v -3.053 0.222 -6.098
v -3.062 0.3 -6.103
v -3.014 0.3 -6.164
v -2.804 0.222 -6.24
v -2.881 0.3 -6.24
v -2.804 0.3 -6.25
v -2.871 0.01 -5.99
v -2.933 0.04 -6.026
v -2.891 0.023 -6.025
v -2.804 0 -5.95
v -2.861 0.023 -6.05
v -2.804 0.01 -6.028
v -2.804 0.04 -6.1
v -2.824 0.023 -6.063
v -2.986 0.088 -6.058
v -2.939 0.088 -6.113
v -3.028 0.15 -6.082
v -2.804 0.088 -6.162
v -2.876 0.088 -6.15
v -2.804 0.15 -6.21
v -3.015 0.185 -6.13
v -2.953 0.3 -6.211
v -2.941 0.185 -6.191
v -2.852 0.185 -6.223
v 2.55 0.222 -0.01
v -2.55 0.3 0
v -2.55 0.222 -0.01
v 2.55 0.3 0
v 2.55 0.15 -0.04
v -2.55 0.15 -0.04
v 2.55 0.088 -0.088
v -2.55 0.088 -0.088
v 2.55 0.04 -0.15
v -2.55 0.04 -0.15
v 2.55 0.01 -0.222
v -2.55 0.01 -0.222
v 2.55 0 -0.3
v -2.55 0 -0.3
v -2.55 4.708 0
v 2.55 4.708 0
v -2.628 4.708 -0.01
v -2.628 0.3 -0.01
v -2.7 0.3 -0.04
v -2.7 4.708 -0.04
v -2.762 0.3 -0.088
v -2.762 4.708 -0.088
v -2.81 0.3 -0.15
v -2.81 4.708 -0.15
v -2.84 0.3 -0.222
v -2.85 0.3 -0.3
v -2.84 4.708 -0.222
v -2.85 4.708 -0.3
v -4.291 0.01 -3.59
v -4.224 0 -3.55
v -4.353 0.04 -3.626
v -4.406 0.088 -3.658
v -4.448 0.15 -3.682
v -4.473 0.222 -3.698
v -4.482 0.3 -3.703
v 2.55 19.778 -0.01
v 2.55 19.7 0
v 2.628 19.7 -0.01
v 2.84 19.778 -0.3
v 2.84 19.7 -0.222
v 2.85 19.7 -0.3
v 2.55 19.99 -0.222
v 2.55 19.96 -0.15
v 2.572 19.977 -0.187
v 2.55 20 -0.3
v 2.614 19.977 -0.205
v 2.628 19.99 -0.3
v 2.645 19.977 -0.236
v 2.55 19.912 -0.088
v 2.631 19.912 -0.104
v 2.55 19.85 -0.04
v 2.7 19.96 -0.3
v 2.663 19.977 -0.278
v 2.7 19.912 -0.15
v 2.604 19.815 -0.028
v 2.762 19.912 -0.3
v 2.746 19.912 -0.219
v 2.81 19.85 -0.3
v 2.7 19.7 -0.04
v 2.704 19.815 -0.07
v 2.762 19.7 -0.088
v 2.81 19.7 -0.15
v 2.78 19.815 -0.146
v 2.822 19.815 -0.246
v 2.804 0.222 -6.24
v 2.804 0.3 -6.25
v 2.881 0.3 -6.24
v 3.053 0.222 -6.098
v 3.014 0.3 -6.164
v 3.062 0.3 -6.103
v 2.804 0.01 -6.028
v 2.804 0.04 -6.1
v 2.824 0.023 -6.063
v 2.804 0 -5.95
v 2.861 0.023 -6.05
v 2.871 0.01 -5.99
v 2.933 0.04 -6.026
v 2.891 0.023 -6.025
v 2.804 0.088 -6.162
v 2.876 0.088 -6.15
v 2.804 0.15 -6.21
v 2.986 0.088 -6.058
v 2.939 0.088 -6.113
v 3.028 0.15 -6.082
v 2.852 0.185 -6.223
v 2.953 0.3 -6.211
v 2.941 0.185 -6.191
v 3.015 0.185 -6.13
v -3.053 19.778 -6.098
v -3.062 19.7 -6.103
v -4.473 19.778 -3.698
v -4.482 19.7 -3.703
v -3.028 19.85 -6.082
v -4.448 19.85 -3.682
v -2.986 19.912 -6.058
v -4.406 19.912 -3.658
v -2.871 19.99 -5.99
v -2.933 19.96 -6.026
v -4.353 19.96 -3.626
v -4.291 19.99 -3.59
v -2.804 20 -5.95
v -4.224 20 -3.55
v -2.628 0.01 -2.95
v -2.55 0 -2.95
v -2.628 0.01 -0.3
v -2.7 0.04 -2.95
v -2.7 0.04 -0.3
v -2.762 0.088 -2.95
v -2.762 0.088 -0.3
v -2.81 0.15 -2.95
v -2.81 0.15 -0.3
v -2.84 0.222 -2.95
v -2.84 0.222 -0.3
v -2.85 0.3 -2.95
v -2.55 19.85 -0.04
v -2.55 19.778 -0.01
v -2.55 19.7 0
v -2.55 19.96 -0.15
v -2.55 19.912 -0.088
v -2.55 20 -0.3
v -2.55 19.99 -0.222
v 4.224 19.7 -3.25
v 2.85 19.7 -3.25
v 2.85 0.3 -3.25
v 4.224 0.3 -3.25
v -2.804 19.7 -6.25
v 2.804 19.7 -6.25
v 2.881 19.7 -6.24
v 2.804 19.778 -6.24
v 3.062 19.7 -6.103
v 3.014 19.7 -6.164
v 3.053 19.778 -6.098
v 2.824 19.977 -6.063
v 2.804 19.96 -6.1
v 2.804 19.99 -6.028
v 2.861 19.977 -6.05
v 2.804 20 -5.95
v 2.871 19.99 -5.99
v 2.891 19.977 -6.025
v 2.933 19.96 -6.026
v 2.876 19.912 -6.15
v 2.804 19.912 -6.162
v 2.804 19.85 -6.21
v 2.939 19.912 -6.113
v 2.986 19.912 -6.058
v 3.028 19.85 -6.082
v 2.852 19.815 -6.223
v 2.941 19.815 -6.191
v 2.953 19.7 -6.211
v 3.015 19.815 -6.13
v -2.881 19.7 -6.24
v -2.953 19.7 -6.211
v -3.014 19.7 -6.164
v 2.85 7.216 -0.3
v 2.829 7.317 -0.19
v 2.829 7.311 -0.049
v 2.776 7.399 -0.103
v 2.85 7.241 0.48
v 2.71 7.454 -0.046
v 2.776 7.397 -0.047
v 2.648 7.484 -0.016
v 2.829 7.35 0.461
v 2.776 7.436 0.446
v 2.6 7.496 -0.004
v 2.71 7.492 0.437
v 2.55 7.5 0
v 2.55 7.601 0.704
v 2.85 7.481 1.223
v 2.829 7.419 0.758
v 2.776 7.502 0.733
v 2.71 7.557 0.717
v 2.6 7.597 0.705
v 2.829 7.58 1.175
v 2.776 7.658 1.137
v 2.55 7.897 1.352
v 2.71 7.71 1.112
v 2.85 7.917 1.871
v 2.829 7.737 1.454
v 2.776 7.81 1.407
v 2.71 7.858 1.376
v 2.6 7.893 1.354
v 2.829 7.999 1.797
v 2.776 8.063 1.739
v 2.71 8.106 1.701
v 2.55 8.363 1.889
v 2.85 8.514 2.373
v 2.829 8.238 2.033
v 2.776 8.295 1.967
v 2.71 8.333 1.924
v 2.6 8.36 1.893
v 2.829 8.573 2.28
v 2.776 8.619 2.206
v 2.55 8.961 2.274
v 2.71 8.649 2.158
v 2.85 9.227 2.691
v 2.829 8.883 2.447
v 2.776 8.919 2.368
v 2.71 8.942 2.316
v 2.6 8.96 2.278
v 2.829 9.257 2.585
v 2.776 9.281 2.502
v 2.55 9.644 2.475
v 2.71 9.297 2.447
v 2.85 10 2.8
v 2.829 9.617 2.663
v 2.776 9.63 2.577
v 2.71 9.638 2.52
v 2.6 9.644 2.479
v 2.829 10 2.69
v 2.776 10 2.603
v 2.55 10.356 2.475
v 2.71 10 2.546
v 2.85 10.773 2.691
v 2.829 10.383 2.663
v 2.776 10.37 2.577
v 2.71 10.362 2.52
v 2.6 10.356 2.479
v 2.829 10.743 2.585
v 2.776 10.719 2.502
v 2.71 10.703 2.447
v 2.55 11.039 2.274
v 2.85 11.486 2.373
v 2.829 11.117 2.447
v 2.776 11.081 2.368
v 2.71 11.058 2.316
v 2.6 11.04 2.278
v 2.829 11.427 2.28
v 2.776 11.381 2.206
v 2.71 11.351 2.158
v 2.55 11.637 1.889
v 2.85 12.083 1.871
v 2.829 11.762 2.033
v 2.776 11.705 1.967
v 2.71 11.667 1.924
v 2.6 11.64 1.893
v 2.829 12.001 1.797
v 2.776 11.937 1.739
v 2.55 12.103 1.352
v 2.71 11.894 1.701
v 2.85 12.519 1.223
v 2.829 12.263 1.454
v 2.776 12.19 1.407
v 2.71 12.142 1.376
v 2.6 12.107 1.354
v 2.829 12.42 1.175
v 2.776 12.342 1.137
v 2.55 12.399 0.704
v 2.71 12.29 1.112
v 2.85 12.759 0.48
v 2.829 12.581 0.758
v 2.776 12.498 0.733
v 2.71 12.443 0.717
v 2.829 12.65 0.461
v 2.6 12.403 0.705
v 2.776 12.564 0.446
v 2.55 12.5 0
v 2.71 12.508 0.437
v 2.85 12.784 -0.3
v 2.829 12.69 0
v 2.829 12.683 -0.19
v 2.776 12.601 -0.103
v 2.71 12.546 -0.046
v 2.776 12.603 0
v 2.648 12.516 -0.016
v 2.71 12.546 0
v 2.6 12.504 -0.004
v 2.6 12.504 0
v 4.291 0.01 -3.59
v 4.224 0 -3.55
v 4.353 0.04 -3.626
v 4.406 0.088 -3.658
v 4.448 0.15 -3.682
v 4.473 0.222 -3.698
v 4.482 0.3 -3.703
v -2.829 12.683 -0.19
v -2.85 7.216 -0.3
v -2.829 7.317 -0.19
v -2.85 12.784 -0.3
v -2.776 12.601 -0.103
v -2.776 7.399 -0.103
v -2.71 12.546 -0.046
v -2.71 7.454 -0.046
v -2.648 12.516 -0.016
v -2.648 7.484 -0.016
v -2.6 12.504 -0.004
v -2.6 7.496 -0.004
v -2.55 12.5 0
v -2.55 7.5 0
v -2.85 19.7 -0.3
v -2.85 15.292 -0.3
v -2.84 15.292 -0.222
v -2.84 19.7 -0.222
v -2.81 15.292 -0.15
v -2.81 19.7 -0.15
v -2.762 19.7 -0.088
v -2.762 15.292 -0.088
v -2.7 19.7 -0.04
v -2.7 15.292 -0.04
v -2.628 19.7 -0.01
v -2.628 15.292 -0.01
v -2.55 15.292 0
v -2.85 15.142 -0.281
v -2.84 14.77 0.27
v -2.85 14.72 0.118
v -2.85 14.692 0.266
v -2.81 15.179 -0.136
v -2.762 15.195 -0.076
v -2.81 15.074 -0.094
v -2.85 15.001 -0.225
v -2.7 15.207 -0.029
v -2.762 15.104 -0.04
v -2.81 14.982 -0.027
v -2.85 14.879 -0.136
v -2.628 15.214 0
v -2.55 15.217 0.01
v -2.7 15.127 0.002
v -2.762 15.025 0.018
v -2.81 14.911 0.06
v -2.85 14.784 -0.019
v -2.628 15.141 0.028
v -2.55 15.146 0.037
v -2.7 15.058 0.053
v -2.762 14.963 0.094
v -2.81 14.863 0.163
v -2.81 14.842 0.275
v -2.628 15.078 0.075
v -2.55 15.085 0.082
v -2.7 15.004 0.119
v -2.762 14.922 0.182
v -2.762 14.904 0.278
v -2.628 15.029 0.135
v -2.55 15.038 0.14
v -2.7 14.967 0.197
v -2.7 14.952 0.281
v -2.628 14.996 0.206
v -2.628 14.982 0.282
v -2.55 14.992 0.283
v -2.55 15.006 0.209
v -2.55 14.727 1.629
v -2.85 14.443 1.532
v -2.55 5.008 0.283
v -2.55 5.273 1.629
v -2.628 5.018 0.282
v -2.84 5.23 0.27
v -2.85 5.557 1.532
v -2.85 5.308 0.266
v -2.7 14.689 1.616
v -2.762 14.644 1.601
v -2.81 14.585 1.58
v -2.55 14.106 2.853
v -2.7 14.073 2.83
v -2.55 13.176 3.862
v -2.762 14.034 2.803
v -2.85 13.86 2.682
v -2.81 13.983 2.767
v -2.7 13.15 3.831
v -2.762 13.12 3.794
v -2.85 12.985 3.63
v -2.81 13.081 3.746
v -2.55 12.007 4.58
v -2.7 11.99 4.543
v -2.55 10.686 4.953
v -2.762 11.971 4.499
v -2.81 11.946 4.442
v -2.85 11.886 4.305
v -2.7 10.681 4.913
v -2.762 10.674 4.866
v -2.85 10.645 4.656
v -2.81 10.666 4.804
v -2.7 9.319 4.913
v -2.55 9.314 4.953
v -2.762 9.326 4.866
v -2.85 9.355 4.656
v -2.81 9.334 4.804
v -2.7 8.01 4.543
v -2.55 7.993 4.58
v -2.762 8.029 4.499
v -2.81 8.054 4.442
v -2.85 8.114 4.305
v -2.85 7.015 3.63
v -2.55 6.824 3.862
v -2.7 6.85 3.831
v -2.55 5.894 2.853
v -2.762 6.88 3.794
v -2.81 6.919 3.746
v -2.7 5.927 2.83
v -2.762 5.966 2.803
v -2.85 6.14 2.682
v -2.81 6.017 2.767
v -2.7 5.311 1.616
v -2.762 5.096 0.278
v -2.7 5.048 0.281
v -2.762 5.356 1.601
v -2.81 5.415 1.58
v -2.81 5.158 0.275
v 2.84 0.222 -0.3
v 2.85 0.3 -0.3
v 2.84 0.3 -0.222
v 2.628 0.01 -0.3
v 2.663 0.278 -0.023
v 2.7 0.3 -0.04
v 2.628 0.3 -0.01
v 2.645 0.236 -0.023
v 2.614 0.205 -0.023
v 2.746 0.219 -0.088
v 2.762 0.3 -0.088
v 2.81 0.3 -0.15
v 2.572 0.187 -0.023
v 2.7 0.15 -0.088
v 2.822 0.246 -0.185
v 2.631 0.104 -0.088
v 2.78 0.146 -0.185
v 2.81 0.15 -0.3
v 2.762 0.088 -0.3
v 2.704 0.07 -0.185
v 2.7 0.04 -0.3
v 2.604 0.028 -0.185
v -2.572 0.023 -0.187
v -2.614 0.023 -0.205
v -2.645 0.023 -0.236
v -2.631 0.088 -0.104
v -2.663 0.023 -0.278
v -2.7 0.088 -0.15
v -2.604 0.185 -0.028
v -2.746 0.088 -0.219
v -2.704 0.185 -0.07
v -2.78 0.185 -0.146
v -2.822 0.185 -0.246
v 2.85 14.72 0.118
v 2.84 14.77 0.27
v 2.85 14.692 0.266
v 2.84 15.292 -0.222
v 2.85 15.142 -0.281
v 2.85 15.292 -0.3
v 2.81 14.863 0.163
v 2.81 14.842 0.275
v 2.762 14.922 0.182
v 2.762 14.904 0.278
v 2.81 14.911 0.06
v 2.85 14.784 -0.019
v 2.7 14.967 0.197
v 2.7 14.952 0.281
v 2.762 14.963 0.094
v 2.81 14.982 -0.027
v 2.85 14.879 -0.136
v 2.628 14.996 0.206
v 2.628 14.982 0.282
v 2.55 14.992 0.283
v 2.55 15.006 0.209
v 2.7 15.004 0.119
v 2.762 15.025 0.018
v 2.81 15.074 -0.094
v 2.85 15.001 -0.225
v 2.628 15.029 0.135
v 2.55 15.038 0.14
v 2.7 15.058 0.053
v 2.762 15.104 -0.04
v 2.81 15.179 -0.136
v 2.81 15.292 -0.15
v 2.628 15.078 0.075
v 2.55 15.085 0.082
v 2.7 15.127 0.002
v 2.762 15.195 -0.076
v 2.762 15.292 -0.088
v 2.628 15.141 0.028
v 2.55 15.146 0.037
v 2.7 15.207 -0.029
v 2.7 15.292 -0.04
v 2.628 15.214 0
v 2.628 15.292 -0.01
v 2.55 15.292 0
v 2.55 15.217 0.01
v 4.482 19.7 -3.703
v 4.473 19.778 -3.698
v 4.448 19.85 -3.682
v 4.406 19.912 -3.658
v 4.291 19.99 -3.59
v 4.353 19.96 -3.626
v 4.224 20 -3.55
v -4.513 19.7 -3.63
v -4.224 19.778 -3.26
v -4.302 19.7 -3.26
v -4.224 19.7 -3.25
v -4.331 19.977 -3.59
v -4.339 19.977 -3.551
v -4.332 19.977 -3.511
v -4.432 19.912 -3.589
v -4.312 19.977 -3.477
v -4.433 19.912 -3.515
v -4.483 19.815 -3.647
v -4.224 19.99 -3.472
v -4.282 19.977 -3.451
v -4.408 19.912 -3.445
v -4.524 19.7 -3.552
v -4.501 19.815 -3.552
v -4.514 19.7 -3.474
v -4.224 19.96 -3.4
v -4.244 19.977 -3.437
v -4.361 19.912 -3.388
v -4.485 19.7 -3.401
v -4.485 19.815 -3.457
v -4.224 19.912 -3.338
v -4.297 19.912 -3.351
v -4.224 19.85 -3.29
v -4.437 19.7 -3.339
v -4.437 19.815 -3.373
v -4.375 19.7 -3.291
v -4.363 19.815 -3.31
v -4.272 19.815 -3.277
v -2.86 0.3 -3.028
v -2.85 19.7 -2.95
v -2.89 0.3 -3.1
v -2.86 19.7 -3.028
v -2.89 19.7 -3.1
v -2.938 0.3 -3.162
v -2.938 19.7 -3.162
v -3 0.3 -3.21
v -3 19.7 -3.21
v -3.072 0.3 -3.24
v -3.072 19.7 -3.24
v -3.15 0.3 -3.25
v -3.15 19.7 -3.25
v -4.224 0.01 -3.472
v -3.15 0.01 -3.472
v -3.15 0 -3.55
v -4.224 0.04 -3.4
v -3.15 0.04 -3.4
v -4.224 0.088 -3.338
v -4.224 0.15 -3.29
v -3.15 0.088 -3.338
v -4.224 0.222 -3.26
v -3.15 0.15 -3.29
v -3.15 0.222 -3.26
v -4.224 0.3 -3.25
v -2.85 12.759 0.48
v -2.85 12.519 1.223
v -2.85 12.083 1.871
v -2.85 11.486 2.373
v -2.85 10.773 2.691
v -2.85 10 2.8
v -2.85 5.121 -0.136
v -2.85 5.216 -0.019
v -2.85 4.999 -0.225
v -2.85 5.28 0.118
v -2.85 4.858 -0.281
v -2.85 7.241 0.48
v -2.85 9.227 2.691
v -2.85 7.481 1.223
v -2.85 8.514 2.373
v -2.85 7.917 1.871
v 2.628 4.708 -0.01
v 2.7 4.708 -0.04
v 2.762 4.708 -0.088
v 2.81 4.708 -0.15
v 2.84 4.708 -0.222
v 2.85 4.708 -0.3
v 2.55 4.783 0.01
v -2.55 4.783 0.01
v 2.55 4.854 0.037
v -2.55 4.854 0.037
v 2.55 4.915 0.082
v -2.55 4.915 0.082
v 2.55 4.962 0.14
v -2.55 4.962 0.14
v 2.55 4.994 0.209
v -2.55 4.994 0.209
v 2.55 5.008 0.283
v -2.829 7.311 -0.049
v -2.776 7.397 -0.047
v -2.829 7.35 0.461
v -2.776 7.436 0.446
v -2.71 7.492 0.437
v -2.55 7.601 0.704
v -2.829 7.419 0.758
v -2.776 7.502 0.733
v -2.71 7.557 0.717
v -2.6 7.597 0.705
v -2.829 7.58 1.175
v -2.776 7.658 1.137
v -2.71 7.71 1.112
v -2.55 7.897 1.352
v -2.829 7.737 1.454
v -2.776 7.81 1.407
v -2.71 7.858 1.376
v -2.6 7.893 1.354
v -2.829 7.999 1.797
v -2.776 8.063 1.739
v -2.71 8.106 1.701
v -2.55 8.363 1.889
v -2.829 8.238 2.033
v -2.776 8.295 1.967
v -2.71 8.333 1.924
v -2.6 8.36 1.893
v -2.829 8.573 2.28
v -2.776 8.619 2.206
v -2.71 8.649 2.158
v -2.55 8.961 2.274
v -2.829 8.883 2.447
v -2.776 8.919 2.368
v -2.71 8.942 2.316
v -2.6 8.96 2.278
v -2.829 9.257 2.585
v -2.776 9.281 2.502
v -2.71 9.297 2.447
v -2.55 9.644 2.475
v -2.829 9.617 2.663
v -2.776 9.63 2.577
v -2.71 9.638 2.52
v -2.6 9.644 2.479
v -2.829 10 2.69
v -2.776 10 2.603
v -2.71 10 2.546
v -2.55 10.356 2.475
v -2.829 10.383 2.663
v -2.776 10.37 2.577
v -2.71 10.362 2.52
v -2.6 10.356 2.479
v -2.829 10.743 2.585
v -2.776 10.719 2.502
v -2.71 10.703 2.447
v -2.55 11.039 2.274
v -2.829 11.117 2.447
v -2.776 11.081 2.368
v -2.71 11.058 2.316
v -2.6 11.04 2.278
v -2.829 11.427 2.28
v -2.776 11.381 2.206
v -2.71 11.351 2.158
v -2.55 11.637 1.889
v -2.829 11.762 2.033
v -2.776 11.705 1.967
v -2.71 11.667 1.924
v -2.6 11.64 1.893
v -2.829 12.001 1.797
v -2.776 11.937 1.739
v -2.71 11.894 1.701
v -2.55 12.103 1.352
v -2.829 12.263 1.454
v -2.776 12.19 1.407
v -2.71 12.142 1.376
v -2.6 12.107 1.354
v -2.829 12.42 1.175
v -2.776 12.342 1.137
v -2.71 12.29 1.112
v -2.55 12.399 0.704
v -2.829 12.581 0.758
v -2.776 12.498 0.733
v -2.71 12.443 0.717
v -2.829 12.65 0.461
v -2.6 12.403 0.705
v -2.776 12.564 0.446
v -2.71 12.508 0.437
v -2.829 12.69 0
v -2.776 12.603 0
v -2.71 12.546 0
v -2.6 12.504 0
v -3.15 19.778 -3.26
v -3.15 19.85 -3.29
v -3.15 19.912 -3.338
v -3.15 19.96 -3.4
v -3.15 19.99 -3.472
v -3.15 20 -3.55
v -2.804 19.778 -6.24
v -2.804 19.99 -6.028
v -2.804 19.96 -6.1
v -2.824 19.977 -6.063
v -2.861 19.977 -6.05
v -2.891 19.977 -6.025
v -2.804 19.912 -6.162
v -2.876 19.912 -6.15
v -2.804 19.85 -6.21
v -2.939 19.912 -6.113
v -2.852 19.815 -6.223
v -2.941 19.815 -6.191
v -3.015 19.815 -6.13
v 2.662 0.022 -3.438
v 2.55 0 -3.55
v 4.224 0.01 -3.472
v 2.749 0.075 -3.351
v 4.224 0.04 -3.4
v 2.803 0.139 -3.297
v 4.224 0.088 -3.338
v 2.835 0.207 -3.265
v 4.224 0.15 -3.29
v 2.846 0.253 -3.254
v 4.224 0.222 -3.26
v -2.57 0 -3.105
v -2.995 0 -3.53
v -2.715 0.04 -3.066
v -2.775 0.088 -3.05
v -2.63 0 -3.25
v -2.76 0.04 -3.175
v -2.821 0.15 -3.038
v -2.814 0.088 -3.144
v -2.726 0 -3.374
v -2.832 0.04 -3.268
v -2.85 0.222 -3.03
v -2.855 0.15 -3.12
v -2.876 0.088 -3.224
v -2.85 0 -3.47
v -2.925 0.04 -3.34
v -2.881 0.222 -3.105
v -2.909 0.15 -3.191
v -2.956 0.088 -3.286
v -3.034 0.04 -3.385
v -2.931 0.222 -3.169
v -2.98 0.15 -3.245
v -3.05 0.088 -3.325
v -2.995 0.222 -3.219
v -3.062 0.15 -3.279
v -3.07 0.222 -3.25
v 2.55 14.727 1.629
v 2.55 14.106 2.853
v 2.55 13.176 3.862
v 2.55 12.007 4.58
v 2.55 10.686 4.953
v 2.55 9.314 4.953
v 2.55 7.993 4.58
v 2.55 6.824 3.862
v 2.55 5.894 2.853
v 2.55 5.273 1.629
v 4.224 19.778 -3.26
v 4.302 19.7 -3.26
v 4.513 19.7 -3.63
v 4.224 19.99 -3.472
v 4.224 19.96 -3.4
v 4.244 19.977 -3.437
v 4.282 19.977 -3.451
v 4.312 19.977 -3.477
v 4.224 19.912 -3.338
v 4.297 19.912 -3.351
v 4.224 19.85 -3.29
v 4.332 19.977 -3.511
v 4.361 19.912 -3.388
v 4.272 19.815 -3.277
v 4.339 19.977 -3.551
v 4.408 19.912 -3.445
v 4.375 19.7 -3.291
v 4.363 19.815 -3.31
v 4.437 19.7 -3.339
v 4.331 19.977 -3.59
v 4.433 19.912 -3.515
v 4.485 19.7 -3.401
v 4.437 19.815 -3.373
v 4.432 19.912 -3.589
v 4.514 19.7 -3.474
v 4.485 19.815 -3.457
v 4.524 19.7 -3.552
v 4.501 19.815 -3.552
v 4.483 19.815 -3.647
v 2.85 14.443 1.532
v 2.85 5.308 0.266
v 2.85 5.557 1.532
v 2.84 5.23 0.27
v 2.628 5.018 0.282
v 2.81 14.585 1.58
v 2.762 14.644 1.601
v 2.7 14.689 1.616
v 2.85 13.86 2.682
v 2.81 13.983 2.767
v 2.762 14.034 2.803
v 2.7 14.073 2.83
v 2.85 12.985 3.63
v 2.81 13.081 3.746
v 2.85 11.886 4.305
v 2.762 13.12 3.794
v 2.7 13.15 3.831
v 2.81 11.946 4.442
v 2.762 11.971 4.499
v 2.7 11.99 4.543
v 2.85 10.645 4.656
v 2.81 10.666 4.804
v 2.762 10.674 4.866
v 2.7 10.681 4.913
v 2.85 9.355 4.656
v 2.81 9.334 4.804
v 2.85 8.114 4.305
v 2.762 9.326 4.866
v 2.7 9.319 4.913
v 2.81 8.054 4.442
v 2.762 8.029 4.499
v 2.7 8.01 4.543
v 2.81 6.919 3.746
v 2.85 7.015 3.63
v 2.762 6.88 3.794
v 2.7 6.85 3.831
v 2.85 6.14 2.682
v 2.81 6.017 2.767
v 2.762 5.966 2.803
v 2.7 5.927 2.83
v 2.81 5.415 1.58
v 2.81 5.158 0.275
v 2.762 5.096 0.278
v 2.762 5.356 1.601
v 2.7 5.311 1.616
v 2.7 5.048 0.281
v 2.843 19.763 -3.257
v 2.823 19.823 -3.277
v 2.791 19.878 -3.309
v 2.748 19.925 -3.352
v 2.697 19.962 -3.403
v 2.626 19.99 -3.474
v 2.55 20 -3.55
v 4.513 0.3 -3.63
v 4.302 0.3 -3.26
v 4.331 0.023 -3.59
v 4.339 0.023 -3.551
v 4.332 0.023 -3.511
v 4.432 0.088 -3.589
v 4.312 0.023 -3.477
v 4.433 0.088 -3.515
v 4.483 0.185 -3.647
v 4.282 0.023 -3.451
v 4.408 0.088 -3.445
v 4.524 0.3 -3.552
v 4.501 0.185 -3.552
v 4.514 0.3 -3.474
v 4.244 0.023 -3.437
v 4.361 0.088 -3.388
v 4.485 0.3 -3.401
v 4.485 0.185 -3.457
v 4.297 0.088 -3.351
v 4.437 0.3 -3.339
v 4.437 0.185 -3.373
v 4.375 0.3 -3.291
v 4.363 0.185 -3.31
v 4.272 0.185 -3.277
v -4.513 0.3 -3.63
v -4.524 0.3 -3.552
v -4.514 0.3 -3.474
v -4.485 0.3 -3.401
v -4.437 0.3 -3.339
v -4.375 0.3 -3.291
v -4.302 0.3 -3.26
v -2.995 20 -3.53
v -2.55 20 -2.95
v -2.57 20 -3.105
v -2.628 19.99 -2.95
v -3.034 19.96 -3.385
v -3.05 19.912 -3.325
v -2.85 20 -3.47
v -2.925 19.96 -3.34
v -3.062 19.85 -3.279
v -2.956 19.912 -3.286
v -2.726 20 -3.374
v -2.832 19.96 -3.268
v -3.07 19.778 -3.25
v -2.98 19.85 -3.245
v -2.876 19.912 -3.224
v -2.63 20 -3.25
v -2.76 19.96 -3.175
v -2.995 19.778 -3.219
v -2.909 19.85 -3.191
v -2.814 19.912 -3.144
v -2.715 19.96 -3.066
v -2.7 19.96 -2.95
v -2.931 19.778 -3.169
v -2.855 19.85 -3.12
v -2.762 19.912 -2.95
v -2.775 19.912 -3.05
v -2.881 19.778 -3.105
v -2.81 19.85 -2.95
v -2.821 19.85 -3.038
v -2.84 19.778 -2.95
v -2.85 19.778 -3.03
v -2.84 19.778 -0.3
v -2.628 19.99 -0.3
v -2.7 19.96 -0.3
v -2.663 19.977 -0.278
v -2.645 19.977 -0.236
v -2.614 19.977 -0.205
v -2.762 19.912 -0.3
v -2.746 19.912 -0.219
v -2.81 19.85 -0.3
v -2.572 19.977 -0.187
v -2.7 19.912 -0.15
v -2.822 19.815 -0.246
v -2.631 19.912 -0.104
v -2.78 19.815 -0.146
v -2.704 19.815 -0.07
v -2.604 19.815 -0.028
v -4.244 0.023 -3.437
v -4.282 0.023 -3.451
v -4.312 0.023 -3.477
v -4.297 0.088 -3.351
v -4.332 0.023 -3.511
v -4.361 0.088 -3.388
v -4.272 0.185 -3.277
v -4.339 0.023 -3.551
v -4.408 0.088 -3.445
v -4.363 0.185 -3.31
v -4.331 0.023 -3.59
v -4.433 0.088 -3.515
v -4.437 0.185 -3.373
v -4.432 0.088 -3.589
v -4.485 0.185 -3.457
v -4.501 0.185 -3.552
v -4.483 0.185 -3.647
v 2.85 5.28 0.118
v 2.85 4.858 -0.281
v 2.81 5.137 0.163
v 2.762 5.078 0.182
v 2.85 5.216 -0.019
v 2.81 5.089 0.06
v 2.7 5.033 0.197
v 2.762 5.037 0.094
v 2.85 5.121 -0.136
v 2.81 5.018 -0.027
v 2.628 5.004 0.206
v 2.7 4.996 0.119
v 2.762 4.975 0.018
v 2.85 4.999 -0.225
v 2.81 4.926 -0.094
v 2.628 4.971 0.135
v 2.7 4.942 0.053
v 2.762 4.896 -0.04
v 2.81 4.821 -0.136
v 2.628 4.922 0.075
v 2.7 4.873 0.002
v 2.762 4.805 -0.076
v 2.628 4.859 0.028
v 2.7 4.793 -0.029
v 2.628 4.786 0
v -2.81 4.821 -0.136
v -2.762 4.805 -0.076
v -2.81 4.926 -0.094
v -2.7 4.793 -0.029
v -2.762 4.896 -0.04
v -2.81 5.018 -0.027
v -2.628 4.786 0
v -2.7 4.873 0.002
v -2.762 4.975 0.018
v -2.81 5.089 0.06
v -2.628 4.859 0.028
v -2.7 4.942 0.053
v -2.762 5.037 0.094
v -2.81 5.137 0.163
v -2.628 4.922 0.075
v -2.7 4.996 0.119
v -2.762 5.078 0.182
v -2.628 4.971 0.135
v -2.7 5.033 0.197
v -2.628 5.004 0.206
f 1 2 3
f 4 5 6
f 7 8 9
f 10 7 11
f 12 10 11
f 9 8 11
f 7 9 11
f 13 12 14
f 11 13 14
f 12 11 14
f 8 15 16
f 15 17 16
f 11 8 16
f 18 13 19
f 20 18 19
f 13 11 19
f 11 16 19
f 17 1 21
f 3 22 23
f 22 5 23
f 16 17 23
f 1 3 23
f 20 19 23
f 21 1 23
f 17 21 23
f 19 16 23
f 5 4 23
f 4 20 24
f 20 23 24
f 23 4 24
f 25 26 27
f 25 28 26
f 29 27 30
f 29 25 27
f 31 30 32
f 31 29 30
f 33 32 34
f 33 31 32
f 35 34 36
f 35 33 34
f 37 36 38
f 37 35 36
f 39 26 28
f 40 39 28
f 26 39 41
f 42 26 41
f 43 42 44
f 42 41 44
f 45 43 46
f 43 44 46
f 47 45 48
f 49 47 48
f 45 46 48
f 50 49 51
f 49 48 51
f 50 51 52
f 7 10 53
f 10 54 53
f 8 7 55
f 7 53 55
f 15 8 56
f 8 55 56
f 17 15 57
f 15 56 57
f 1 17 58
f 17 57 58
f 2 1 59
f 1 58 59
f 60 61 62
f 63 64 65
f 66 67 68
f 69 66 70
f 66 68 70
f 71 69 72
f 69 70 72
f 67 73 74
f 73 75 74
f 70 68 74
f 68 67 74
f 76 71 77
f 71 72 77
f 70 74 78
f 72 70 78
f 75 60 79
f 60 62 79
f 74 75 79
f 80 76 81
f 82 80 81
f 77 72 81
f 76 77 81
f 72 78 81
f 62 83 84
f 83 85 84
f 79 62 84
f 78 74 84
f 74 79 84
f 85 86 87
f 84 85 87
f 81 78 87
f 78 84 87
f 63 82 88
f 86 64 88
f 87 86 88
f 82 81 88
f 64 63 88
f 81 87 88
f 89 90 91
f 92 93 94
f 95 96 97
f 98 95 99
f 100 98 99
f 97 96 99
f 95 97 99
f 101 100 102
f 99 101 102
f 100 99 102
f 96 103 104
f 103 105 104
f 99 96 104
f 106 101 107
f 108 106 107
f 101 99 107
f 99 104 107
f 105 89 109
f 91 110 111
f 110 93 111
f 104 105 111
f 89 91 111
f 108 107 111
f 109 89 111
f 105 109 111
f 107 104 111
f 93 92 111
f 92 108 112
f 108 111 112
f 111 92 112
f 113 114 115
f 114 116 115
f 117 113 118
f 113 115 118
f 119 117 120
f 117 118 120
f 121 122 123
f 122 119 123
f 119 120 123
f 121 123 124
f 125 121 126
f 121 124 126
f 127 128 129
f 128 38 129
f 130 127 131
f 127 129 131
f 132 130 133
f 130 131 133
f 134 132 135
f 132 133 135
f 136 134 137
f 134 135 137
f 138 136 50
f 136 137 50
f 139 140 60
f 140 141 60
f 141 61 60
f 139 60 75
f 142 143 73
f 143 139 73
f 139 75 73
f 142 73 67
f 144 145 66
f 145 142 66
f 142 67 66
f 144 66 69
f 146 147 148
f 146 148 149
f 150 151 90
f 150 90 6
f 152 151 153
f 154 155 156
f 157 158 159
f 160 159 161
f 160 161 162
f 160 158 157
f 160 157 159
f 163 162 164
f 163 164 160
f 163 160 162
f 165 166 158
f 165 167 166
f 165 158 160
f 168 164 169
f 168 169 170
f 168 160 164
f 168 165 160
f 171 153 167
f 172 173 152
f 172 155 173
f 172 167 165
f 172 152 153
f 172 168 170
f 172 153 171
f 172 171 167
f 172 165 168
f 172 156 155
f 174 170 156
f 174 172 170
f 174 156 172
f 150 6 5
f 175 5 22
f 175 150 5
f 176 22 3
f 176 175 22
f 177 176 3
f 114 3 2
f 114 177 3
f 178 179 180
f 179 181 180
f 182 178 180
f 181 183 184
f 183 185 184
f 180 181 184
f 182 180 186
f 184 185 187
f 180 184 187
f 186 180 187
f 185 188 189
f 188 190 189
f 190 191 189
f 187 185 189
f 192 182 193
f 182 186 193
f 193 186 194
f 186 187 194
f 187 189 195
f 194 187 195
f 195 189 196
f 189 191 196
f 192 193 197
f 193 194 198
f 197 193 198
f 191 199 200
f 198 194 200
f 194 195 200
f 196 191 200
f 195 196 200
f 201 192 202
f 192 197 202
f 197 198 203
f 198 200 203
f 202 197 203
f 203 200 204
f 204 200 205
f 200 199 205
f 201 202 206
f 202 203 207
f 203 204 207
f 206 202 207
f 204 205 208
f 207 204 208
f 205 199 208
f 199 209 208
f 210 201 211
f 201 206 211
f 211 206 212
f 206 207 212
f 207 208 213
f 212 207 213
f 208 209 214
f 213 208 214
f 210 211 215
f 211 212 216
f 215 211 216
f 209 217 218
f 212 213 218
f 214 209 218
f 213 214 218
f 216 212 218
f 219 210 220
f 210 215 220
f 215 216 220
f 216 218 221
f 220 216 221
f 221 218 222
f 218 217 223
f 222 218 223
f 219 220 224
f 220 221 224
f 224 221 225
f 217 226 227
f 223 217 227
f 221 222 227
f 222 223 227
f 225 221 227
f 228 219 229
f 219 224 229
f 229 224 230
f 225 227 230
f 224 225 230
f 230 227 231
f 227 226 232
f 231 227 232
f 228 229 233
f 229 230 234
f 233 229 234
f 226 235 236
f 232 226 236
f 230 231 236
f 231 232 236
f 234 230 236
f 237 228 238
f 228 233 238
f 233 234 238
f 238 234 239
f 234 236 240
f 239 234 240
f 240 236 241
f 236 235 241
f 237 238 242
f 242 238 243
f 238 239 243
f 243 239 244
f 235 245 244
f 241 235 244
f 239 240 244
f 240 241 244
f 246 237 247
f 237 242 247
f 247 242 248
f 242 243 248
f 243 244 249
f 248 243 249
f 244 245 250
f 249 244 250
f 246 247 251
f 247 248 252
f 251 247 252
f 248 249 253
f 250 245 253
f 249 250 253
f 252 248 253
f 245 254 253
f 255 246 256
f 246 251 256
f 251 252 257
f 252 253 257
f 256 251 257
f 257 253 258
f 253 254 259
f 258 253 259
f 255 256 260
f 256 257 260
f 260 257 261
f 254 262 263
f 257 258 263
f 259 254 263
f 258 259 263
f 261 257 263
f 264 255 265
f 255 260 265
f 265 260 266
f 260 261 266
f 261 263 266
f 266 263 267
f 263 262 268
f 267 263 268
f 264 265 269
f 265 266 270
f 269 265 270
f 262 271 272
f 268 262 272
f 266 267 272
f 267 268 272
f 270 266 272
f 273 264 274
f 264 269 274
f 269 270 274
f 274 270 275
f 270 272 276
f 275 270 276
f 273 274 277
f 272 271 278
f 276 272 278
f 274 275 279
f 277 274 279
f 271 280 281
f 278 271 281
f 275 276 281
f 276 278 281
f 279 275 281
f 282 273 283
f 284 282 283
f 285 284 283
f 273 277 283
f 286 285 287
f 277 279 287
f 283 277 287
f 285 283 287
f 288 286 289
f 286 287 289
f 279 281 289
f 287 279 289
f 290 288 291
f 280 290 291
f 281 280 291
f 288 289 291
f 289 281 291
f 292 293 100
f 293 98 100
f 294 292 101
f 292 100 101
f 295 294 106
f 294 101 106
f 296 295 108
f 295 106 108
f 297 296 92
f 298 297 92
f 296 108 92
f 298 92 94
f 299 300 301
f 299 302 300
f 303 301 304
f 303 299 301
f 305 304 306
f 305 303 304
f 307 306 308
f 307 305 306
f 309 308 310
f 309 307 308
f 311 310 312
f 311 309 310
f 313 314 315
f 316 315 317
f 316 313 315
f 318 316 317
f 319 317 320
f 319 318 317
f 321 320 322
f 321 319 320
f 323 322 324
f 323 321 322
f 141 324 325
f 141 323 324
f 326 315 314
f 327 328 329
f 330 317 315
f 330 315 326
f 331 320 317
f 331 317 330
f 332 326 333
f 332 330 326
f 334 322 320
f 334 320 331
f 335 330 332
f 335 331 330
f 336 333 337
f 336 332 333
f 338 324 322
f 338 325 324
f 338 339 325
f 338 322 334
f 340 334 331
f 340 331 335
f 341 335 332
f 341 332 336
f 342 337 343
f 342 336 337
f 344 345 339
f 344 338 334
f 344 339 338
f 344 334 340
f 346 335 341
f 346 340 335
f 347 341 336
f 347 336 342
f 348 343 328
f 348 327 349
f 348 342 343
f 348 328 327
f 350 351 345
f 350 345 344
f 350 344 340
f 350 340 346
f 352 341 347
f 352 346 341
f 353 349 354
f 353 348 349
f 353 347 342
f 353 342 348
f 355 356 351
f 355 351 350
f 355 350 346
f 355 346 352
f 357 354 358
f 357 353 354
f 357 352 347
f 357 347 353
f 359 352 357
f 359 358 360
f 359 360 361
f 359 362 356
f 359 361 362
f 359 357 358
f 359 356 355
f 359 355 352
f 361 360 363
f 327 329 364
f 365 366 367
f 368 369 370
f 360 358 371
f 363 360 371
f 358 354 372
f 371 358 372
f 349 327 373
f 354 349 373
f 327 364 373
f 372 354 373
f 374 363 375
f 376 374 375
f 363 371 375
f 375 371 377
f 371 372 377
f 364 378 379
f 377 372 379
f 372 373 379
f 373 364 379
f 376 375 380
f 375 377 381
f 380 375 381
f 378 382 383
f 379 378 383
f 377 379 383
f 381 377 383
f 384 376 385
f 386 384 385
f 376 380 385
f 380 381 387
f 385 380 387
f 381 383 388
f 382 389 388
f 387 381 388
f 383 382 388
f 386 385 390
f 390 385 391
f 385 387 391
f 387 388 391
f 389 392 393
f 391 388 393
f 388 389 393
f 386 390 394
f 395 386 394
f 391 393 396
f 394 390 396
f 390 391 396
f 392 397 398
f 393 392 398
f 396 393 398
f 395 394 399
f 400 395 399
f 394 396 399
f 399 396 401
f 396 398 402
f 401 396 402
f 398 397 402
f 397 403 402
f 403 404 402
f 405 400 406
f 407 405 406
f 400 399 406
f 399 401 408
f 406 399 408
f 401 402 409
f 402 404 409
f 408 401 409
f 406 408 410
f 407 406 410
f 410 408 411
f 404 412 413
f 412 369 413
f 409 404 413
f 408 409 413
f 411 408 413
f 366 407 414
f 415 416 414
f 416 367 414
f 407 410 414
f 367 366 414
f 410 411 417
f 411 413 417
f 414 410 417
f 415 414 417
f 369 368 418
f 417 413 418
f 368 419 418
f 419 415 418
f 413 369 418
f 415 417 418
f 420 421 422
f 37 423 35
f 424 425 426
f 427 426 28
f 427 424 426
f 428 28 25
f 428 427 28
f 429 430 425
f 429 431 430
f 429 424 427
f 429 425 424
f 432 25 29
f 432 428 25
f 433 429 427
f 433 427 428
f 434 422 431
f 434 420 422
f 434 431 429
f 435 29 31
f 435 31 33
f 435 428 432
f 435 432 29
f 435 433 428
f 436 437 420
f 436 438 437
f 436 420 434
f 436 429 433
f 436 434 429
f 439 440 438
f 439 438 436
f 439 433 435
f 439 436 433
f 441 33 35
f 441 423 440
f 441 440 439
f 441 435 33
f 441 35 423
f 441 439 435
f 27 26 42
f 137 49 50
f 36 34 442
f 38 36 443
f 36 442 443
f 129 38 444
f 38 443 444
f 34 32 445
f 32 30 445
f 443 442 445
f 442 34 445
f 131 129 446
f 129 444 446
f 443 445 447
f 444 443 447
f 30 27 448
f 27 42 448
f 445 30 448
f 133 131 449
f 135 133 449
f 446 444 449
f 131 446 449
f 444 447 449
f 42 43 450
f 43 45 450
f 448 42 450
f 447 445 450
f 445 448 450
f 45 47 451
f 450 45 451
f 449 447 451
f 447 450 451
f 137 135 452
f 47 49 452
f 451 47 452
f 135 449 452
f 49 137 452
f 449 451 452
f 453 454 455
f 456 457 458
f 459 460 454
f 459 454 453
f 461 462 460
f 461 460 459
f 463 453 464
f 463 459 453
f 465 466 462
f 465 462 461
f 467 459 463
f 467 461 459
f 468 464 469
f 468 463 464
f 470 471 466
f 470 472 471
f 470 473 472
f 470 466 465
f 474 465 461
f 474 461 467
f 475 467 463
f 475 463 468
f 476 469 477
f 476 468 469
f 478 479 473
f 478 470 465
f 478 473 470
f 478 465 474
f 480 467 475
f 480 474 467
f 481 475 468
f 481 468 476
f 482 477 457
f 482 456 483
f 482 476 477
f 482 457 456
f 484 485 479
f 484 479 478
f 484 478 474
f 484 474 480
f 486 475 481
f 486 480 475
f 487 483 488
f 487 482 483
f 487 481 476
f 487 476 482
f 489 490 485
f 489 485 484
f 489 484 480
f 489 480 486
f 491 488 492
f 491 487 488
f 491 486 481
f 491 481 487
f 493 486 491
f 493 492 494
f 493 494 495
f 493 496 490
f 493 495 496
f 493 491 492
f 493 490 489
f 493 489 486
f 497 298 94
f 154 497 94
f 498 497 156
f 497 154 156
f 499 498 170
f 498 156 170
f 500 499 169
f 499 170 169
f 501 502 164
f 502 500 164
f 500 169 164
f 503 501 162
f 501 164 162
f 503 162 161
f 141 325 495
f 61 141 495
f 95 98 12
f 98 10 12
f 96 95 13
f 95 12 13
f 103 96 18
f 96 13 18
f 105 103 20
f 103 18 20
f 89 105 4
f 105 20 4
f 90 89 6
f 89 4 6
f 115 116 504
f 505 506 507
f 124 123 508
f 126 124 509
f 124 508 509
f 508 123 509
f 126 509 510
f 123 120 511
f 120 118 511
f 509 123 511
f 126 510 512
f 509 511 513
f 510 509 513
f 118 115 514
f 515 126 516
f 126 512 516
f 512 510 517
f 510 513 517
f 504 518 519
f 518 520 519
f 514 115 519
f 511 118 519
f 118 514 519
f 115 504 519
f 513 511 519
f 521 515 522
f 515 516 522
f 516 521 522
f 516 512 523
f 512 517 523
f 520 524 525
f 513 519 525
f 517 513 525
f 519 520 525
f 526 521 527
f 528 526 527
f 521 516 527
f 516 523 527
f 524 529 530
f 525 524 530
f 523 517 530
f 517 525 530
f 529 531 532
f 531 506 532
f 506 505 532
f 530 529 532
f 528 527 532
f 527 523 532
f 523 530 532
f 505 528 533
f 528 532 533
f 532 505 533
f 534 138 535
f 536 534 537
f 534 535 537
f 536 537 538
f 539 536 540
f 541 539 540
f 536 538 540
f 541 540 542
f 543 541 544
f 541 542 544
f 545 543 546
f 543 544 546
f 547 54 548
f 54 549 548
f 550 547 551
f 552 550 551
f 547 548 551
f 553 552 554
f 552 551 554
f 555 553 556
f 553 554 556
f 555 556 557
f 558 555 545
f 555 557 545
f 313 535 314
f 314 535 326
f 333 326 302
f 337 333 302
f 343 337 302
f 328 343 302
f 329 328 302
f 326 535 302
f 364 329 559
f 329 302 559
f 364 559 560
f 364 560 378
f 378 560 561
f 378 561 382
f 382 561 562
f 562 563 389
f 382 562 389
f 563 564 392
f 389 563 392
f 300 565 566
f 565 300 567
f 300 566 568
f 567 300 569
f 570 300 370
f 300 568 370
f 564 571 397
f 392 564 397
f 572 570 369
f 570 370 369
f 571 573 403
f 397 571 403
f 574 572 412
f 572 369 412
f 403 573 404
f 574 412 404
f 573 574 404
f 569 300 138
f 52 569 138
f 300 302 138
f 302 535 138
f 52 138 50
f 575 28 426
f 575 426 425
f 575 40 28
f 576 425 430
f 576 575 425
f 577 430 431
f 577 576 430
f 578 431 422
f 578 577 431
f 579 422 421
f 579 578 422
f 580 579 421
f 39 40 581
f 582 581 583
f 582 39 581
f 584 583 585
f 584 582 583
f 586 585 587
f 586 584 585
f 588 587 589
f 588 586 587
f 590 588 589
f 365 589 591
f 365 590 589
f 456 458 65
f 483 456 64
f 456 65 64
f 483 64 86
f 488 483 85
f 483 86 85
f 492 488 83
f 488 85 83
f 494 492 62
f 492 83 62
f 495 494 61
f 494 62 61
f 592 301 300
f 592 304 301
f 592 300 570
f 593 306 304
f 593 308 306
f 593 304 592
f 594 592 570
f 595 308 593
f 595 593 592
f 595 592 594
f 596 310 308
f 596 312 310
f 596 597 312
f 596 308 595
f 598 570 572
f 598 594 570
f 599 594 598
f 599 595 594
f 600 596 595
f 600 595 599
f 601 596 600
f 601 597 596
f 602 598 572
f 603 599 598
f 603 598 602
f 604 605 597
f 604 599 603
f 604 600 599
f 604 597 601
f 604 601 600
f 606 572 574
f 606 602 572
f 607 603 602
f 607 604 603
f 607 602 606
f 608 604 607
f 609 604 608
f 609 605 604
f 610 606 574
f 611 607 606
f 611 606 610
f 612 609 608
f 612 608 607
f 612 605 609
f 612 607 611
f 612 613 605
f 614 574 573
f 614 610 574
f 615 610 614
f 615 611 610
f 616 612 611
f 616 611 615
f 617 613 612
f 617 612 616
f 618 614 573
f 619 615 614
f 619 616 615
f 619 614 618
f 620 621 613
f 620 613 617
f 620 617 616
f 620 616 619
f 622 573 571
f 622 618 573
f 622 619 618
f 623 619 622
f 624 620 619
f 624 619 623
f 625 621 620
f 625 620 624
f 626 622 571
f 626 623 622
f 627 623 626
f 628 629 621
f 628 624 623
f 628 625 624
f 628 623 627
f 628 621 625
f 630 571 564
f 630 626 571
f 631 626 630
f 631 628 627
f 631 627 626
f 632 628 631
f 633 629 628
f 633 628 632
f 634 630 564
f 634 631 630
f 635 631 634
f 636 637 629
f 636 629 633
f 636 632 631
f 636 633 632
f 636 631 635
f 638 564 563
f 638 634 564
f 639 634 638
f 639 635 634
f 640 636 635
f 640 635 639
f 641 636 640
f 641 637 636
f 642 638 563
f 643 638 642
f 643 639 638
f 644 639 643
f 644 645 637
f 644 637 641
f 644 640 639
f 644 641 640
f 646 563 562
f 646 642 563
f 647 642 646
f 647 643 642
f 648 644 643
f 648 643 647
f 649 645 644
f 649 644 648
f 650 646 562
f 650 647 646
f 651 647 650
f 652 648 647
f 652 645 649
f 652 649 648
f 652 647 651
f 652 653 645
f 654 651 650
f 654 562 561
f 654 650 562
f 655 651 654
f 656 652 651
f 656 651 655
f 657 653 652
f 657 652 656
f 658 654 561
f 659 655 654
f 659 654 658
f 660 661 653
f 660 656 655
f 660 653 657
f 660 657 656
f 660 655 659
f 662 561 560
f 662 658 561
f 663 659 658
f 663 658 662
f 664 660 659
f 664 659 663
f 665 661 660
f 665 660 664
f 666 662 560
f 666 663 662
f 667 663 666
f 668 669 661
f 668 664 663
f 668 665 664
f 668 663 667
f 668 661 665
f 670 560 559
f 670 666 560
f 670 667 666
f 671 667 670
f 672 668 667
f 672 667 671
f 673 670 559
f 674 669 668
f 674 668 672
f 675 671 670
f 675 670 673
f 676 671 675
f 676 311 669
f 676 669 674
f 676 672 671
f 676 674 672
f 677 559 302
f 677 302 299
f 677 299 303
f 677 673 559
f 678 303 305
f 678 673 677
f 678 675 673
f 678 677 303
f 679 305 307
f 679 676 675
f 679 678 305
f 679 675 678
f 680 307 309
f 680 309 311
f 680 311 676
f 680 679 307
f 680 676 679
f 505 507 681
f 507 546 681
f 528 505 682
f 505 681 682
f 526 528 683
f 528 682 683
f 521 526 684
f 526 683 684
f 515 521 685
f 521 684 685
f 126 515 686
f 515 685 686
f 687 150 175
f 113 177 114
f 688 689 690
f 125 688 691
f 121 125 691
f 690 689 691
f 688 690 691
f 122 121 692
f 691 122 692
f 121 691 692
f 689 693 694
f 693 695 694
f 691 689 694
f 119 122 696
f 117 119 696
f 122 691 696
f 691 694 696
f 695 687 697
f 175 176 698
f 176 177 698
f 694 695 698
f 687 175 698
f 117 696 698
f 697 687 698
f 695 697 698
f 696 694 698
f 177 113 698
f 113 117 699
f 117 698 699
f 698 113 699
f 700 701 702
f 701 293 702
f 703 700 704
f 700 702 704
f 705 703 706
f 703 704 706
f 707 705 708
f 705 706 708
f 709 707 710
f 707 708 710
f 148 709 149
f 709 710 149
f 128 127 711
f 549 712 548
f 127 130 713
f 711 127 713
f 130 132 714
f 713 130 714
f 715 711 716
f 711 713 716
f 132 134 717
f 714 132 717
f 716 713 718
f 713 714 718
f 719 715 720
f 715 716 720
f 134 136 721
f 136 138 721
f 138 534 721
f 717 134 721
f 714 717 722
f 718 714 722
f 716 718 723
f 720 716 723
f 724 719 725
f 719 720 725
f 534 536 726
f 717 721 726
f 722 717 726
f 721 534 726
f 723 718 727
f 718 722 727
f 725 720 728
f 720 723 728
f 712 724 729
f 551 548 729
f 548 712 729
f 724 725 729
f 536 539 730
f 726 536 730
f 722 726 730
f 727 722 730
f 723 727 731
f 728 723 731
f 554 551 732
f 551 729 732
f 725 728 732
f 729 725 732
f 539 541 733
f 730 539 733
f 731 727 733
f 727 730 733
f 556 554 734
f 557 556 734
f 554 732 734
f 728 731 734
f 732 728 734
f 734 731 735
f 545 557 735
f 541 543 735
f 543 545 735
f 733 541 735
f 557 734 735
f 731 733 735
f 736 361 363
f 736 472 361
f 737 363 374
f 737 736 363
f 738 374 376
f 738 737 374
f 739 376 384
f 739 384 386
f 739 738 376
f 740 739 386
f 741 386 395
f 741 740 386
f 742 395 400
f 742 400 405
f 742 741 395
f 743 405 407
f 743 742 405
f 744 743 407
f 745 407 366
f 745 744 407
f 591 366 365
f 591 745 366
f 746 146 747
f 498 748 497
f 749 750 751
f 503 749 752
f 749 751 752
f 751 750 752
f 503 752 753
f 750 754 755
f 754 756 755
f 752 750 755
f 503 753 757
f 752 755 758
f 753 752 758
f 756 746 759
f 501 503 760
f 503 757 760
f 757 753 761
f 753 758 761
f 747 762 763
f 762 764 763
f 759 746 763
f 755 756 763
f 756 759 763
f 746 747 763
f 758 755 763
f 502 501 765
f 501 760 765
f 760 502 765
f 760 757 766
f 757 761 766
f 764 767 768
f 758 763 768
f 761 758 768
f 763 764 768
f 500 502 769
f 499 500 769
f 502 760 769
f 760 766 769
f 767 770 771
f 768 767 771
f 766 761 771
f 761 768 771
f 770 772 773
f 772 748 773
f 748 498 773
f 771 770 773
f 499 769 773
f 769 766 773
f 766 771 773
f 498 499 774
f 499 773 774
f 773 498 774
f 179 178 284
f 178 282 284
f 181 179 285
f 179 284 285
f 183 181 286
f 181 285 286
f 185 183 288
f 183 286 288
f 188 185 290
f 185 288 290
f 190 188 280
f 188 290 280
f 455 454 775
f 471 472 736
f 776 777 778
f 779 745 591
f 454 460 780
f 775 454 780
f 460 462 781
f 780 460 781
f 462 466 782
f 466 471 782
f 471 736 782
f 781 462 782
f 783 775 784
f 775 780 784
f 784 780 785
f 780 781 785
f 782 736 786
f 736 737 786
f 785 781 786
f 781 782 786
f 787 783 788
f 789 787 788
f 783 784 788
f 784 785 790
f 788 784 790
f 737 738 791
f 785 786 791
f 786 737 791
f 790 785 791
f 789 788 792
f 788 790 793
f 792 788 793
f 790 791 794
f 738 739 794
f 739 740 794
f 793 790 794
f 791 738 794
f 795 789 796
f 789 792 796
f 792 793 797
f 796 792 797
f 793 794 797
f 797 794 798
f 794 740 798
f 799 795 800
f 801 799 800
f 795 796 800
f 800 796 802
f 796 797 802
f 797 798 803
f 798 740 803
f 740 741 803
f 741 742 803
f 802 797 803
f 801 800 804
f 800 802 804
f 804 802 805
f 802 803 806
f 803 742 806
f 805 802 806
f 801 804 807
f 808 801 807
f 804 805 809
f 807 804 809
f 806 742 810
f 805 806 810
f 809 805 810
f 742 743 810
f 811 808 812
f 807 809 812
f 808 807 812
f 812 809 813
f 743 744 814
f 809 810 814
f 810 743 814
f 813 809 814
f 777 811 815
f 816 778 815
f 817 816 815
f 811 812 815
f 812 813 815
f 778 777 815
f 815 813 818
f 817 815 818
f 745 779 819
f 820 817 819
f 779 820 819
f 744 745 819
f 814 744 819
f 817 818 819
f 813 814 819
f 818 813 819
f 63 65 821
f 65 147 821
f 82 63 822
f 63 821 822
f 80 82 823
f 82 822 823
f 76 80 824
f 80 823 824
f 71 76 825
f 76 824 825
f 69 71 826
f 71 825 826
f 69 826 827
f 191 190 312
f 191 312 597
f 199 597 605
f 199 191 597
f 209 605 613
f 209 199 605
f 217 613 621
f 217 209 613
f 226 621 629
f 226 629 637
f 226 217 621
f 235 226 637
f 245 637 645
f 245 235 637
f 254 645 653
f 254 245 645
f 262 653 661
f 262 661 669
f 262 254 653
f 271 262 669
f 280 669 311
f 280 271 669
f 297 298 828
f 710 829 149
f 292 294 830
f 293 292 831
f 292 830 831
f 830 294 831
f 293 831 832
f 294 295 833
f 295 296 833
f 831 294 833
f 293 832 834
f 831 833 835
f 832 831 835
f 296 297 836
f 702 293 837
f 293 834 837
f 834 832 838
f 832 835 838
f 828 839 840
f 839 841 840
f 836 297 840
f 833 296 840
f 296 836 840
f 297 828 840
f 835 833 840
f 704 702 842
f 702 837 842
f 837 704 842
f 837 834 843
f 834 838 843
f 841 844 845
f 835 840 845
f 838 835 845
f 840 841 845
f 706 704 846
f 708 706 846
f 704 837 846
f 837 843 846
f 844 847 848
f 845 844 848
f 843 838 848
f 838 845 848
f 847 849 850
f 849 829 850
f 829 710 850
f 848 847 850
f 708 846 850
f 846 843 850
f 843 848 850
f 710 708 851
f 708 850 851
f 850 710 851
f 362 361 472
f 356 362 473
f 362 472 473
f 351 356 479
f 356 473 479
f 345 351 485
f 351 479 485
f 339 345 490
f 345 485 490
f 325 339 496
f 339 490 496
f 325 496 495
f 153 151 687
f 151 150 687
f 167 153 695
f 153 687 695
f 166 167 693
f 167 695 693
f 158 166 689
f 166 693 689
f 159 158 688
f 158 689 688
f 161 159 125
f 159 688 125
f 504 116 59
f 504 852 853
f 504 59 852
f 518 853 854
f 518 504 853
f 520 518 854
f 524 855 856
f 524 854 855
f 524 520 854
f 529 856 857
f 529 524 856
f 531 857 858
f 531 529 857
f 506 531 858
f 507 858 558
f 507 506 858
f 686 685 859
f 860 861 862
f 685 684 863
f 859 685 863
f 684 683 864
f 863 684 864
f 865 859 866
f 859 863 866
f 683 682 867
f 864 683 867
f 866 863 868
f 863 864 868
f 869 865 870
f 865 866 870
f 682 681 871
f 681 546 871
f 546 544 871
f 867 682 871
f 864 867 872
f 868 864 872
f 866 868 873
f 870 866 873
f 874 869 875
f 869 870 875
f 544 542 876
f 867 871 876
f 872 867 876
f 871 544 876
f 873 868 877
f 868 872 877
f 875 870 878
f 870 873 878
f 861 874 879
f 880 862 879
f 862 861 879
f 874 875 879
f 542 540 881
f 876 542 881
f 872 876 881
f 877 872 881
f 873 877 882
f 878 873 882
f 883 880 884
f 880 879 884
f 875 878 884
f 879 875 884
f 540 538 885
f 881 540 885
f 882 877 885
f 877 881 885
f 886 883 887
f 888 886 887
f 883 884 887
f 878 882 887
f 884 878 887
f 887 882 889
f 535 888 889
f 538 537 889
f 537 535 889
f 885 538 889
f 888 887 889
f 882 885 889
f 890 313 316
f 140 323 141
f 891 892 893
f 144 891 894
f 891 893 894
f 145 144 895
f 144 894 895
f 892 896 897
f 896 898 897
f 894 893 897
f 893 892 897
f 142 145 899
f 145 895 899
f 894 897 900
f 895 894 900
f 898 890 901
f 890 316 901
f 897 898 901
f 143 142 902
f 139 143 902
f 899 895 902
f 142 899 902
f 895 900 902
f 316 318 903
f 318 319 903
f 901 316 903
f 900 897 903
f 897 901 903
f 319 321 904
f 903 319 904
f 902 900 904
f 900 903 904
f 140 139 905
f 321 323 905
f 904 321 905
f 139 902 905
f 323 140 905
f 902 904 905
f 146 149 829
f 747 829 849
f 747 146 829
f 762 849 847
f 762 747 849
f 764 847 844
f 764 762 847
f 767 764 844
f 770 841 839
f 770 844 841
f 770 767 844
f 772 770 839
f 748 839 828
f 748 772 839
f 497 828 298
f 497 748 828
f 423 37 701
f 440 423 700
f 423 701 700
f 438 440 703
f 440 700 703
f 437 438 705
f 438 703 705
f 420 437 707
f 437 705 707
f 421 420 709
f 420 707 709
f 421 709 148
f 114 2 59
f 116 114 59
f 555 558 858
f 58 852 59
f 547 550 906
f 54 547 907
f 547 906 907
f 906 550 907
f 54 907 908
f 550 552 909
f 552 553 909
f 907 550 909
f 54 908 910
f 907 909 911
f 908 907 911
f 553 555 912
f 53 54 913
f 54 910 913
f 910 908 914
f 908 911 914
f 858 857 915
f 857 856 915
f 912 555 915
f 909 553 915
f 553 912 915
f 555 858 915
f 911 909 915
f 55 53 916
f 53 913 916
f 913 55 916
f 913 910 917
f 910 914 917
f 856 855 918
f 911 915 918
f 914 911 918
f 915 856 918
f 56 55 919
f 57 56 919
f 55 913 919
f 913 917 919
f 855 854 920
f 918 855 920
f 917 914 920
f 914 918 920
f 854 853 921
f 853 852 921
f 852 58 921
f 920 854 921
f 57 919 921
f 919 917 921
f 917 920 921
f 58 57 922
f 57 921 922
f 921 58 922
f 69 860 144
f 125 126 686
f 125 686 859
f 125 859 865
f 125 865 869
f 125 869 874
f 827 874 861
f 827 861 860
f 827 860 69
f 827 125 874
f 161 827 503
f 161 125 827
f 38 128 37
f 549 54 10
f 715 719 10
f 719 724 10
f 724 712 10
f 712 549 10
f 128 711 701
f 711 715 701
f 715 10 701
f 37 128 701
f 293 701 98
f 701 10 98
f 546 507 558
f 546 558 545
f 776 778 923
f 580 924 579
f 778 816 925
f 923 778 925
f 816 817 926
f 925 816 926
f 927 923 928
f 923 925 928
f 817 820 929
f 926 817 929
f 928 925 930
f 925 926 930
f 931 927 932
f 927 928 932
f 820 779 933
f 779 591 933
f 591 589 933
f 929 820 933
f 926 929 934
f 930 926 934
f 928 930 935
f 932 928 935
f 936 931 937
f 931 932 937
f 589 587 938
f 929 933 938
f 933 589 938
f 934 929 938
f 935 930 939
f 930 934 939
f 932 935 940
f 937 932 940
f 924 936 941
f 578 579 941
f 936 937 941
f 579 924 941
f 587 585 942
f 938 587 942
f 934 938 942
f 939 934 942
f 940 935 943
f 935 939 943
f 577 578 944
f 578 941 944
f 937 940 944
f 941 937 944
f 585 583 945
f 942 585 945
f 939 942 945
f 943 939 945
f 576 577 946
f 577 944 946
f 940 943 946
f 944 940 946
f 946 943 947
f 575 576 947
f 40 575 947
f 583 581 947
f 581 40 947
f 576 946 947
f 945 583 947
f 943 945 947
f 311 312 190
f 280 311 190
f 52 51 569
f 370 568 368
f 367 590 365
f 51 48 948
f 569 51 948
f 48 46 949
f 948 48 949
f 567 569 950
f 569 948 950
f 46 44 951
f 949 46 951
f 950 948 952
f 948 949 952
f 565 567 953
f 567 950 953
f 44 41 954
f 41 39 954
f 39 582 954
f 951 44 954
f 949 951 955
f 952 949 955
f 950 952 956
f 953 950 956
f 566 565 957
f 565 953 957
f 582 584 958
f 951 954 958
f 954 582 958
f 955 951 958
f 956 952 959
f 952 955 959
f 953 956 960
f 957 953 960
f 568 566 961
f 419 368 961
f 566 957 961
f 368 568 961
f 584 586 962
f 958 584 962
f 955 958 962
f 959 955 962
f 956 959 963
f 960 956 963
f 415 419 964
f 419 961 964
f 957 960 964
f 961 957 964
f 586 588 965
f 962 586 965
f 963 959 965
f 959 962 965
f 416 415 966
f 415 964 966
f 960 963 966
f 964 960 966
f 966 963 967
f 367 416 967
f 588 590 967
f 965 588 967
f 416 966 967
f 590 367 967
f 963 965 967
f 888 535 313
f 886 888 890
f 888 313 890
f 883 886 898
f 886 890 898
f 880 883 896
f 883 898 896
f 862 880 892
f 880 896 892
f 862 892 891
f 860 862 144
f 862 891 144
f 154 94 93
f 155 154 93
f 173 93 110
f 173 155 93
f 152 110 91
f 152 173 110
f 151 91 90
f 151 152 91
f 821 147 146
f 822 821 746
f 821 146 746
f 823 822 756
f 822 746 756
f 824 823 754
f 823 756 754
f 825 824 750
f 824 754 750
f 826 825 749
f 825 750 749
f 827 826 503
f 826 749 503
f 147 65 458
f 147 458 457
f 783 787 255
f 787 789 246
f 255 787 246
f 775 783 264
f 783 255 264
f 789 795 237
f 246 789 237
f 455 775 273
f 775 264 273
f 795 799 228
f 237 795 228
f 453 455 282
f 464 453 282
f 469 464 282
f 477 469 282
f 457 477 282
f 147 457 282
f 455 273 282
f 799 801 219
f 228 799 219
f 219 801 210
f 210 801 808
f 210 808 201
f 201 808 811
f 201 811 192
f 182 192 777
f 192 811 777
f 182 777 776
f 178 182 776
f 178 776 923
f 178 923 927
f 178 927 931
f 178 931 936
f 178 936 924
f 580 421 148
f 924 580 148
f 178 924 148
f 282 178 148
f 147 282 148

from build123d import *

# Parameters (mm, degrees)
BOSS_EXTRUDE1_DEPTH = 20
BOSS_EXTRUDE2_DEPTH = 2.85
FILLET1_R           = 0.3


with BuildPart() as part:
    # Sketch1 → Boss-Extrude1 (new body)
    with BuildSketch(Plane(origin=(0, 0, 0), x_dir=(1, 0, 0), z_dir=(0, 1, 0))):
        Polygon((-2.85, 0), (2.85, 0), (2.85, 3.25), (4.75, 3.25), (2.975, 6.25), (-2.975, 6.25), (-4.75, 3.25), (-2.85, 3.25), align=None)
    extrude(amount=BOSS_EXTRUDE1_DEPTH)

    # Sketch3 → Boss-Extrude2 (add, symmetric)
    with BuildSketch(Plane(origin=(0, 0, 0), x_dir=(0, 0, -1), z_dir=(1, 0, 0))):
        with BuildLine():
            ThreePointArc((0, 7.5), (-2.5, 10), (0, 12.5))
            Line((0, 12.5), (0, 15))
            ThreePointArc((0, 15), (-5, 10), (0, 5))
            Line((0, 5), (0, 7.5))
        make_face()
    extrude(amount=BOSS_EXTRUDE2_DEPTH, both=True)

    # Fillet1
    fillet1_edges = [part.edges().sort_by_distance(p)[0] for p in [
        (0, 0, -6.25),
        (3.8625, 0, -4.75),
        (3.8, 0, -3.25),
        (2.85, 0, -1.625),
        (3.8625, 20, -4.75),
        (2.85, 17.5, 0),
        (-2.85, 17.5, 0),
        (-2.85, 10, -3.25),
        (-4.75, 10, -3.25),
        (-2.975, 10, -6.25),
        (2.975, 10, -6.25),
        (4.75, 10, -3.25),
        (0, 20, -6.25),
        (-3.8625, 20, -4.75),
        (2.85, 10, 0),
        (-3.8, 20, -3.25),
        (2.85, 2.5, 0),
        (-2.85, 10, 0),
        (-2.85, 2.5, 0),
        (2.85, 10, 2.5),
        (-2.85, 20, -1.625),
        (-2.85, 10, 5),
        (0, 15, 0),
        (0, 5, 0),
        (2.85, 10, 5),
        (-2.85, 10, 2.5),
        (0, 20, 0),
        (2.85, 20, -1.625),
        (0, 0, 0),
        (3.8, 20, -3.25),
        (-2.85, 0, -1.625),
        (-3.8, 0, -3.25),
        (-3.8625, 0, -4.75),
    ]]
    fillet(fillet1_edges, radius=FILLET1_R)


solid = part.part
